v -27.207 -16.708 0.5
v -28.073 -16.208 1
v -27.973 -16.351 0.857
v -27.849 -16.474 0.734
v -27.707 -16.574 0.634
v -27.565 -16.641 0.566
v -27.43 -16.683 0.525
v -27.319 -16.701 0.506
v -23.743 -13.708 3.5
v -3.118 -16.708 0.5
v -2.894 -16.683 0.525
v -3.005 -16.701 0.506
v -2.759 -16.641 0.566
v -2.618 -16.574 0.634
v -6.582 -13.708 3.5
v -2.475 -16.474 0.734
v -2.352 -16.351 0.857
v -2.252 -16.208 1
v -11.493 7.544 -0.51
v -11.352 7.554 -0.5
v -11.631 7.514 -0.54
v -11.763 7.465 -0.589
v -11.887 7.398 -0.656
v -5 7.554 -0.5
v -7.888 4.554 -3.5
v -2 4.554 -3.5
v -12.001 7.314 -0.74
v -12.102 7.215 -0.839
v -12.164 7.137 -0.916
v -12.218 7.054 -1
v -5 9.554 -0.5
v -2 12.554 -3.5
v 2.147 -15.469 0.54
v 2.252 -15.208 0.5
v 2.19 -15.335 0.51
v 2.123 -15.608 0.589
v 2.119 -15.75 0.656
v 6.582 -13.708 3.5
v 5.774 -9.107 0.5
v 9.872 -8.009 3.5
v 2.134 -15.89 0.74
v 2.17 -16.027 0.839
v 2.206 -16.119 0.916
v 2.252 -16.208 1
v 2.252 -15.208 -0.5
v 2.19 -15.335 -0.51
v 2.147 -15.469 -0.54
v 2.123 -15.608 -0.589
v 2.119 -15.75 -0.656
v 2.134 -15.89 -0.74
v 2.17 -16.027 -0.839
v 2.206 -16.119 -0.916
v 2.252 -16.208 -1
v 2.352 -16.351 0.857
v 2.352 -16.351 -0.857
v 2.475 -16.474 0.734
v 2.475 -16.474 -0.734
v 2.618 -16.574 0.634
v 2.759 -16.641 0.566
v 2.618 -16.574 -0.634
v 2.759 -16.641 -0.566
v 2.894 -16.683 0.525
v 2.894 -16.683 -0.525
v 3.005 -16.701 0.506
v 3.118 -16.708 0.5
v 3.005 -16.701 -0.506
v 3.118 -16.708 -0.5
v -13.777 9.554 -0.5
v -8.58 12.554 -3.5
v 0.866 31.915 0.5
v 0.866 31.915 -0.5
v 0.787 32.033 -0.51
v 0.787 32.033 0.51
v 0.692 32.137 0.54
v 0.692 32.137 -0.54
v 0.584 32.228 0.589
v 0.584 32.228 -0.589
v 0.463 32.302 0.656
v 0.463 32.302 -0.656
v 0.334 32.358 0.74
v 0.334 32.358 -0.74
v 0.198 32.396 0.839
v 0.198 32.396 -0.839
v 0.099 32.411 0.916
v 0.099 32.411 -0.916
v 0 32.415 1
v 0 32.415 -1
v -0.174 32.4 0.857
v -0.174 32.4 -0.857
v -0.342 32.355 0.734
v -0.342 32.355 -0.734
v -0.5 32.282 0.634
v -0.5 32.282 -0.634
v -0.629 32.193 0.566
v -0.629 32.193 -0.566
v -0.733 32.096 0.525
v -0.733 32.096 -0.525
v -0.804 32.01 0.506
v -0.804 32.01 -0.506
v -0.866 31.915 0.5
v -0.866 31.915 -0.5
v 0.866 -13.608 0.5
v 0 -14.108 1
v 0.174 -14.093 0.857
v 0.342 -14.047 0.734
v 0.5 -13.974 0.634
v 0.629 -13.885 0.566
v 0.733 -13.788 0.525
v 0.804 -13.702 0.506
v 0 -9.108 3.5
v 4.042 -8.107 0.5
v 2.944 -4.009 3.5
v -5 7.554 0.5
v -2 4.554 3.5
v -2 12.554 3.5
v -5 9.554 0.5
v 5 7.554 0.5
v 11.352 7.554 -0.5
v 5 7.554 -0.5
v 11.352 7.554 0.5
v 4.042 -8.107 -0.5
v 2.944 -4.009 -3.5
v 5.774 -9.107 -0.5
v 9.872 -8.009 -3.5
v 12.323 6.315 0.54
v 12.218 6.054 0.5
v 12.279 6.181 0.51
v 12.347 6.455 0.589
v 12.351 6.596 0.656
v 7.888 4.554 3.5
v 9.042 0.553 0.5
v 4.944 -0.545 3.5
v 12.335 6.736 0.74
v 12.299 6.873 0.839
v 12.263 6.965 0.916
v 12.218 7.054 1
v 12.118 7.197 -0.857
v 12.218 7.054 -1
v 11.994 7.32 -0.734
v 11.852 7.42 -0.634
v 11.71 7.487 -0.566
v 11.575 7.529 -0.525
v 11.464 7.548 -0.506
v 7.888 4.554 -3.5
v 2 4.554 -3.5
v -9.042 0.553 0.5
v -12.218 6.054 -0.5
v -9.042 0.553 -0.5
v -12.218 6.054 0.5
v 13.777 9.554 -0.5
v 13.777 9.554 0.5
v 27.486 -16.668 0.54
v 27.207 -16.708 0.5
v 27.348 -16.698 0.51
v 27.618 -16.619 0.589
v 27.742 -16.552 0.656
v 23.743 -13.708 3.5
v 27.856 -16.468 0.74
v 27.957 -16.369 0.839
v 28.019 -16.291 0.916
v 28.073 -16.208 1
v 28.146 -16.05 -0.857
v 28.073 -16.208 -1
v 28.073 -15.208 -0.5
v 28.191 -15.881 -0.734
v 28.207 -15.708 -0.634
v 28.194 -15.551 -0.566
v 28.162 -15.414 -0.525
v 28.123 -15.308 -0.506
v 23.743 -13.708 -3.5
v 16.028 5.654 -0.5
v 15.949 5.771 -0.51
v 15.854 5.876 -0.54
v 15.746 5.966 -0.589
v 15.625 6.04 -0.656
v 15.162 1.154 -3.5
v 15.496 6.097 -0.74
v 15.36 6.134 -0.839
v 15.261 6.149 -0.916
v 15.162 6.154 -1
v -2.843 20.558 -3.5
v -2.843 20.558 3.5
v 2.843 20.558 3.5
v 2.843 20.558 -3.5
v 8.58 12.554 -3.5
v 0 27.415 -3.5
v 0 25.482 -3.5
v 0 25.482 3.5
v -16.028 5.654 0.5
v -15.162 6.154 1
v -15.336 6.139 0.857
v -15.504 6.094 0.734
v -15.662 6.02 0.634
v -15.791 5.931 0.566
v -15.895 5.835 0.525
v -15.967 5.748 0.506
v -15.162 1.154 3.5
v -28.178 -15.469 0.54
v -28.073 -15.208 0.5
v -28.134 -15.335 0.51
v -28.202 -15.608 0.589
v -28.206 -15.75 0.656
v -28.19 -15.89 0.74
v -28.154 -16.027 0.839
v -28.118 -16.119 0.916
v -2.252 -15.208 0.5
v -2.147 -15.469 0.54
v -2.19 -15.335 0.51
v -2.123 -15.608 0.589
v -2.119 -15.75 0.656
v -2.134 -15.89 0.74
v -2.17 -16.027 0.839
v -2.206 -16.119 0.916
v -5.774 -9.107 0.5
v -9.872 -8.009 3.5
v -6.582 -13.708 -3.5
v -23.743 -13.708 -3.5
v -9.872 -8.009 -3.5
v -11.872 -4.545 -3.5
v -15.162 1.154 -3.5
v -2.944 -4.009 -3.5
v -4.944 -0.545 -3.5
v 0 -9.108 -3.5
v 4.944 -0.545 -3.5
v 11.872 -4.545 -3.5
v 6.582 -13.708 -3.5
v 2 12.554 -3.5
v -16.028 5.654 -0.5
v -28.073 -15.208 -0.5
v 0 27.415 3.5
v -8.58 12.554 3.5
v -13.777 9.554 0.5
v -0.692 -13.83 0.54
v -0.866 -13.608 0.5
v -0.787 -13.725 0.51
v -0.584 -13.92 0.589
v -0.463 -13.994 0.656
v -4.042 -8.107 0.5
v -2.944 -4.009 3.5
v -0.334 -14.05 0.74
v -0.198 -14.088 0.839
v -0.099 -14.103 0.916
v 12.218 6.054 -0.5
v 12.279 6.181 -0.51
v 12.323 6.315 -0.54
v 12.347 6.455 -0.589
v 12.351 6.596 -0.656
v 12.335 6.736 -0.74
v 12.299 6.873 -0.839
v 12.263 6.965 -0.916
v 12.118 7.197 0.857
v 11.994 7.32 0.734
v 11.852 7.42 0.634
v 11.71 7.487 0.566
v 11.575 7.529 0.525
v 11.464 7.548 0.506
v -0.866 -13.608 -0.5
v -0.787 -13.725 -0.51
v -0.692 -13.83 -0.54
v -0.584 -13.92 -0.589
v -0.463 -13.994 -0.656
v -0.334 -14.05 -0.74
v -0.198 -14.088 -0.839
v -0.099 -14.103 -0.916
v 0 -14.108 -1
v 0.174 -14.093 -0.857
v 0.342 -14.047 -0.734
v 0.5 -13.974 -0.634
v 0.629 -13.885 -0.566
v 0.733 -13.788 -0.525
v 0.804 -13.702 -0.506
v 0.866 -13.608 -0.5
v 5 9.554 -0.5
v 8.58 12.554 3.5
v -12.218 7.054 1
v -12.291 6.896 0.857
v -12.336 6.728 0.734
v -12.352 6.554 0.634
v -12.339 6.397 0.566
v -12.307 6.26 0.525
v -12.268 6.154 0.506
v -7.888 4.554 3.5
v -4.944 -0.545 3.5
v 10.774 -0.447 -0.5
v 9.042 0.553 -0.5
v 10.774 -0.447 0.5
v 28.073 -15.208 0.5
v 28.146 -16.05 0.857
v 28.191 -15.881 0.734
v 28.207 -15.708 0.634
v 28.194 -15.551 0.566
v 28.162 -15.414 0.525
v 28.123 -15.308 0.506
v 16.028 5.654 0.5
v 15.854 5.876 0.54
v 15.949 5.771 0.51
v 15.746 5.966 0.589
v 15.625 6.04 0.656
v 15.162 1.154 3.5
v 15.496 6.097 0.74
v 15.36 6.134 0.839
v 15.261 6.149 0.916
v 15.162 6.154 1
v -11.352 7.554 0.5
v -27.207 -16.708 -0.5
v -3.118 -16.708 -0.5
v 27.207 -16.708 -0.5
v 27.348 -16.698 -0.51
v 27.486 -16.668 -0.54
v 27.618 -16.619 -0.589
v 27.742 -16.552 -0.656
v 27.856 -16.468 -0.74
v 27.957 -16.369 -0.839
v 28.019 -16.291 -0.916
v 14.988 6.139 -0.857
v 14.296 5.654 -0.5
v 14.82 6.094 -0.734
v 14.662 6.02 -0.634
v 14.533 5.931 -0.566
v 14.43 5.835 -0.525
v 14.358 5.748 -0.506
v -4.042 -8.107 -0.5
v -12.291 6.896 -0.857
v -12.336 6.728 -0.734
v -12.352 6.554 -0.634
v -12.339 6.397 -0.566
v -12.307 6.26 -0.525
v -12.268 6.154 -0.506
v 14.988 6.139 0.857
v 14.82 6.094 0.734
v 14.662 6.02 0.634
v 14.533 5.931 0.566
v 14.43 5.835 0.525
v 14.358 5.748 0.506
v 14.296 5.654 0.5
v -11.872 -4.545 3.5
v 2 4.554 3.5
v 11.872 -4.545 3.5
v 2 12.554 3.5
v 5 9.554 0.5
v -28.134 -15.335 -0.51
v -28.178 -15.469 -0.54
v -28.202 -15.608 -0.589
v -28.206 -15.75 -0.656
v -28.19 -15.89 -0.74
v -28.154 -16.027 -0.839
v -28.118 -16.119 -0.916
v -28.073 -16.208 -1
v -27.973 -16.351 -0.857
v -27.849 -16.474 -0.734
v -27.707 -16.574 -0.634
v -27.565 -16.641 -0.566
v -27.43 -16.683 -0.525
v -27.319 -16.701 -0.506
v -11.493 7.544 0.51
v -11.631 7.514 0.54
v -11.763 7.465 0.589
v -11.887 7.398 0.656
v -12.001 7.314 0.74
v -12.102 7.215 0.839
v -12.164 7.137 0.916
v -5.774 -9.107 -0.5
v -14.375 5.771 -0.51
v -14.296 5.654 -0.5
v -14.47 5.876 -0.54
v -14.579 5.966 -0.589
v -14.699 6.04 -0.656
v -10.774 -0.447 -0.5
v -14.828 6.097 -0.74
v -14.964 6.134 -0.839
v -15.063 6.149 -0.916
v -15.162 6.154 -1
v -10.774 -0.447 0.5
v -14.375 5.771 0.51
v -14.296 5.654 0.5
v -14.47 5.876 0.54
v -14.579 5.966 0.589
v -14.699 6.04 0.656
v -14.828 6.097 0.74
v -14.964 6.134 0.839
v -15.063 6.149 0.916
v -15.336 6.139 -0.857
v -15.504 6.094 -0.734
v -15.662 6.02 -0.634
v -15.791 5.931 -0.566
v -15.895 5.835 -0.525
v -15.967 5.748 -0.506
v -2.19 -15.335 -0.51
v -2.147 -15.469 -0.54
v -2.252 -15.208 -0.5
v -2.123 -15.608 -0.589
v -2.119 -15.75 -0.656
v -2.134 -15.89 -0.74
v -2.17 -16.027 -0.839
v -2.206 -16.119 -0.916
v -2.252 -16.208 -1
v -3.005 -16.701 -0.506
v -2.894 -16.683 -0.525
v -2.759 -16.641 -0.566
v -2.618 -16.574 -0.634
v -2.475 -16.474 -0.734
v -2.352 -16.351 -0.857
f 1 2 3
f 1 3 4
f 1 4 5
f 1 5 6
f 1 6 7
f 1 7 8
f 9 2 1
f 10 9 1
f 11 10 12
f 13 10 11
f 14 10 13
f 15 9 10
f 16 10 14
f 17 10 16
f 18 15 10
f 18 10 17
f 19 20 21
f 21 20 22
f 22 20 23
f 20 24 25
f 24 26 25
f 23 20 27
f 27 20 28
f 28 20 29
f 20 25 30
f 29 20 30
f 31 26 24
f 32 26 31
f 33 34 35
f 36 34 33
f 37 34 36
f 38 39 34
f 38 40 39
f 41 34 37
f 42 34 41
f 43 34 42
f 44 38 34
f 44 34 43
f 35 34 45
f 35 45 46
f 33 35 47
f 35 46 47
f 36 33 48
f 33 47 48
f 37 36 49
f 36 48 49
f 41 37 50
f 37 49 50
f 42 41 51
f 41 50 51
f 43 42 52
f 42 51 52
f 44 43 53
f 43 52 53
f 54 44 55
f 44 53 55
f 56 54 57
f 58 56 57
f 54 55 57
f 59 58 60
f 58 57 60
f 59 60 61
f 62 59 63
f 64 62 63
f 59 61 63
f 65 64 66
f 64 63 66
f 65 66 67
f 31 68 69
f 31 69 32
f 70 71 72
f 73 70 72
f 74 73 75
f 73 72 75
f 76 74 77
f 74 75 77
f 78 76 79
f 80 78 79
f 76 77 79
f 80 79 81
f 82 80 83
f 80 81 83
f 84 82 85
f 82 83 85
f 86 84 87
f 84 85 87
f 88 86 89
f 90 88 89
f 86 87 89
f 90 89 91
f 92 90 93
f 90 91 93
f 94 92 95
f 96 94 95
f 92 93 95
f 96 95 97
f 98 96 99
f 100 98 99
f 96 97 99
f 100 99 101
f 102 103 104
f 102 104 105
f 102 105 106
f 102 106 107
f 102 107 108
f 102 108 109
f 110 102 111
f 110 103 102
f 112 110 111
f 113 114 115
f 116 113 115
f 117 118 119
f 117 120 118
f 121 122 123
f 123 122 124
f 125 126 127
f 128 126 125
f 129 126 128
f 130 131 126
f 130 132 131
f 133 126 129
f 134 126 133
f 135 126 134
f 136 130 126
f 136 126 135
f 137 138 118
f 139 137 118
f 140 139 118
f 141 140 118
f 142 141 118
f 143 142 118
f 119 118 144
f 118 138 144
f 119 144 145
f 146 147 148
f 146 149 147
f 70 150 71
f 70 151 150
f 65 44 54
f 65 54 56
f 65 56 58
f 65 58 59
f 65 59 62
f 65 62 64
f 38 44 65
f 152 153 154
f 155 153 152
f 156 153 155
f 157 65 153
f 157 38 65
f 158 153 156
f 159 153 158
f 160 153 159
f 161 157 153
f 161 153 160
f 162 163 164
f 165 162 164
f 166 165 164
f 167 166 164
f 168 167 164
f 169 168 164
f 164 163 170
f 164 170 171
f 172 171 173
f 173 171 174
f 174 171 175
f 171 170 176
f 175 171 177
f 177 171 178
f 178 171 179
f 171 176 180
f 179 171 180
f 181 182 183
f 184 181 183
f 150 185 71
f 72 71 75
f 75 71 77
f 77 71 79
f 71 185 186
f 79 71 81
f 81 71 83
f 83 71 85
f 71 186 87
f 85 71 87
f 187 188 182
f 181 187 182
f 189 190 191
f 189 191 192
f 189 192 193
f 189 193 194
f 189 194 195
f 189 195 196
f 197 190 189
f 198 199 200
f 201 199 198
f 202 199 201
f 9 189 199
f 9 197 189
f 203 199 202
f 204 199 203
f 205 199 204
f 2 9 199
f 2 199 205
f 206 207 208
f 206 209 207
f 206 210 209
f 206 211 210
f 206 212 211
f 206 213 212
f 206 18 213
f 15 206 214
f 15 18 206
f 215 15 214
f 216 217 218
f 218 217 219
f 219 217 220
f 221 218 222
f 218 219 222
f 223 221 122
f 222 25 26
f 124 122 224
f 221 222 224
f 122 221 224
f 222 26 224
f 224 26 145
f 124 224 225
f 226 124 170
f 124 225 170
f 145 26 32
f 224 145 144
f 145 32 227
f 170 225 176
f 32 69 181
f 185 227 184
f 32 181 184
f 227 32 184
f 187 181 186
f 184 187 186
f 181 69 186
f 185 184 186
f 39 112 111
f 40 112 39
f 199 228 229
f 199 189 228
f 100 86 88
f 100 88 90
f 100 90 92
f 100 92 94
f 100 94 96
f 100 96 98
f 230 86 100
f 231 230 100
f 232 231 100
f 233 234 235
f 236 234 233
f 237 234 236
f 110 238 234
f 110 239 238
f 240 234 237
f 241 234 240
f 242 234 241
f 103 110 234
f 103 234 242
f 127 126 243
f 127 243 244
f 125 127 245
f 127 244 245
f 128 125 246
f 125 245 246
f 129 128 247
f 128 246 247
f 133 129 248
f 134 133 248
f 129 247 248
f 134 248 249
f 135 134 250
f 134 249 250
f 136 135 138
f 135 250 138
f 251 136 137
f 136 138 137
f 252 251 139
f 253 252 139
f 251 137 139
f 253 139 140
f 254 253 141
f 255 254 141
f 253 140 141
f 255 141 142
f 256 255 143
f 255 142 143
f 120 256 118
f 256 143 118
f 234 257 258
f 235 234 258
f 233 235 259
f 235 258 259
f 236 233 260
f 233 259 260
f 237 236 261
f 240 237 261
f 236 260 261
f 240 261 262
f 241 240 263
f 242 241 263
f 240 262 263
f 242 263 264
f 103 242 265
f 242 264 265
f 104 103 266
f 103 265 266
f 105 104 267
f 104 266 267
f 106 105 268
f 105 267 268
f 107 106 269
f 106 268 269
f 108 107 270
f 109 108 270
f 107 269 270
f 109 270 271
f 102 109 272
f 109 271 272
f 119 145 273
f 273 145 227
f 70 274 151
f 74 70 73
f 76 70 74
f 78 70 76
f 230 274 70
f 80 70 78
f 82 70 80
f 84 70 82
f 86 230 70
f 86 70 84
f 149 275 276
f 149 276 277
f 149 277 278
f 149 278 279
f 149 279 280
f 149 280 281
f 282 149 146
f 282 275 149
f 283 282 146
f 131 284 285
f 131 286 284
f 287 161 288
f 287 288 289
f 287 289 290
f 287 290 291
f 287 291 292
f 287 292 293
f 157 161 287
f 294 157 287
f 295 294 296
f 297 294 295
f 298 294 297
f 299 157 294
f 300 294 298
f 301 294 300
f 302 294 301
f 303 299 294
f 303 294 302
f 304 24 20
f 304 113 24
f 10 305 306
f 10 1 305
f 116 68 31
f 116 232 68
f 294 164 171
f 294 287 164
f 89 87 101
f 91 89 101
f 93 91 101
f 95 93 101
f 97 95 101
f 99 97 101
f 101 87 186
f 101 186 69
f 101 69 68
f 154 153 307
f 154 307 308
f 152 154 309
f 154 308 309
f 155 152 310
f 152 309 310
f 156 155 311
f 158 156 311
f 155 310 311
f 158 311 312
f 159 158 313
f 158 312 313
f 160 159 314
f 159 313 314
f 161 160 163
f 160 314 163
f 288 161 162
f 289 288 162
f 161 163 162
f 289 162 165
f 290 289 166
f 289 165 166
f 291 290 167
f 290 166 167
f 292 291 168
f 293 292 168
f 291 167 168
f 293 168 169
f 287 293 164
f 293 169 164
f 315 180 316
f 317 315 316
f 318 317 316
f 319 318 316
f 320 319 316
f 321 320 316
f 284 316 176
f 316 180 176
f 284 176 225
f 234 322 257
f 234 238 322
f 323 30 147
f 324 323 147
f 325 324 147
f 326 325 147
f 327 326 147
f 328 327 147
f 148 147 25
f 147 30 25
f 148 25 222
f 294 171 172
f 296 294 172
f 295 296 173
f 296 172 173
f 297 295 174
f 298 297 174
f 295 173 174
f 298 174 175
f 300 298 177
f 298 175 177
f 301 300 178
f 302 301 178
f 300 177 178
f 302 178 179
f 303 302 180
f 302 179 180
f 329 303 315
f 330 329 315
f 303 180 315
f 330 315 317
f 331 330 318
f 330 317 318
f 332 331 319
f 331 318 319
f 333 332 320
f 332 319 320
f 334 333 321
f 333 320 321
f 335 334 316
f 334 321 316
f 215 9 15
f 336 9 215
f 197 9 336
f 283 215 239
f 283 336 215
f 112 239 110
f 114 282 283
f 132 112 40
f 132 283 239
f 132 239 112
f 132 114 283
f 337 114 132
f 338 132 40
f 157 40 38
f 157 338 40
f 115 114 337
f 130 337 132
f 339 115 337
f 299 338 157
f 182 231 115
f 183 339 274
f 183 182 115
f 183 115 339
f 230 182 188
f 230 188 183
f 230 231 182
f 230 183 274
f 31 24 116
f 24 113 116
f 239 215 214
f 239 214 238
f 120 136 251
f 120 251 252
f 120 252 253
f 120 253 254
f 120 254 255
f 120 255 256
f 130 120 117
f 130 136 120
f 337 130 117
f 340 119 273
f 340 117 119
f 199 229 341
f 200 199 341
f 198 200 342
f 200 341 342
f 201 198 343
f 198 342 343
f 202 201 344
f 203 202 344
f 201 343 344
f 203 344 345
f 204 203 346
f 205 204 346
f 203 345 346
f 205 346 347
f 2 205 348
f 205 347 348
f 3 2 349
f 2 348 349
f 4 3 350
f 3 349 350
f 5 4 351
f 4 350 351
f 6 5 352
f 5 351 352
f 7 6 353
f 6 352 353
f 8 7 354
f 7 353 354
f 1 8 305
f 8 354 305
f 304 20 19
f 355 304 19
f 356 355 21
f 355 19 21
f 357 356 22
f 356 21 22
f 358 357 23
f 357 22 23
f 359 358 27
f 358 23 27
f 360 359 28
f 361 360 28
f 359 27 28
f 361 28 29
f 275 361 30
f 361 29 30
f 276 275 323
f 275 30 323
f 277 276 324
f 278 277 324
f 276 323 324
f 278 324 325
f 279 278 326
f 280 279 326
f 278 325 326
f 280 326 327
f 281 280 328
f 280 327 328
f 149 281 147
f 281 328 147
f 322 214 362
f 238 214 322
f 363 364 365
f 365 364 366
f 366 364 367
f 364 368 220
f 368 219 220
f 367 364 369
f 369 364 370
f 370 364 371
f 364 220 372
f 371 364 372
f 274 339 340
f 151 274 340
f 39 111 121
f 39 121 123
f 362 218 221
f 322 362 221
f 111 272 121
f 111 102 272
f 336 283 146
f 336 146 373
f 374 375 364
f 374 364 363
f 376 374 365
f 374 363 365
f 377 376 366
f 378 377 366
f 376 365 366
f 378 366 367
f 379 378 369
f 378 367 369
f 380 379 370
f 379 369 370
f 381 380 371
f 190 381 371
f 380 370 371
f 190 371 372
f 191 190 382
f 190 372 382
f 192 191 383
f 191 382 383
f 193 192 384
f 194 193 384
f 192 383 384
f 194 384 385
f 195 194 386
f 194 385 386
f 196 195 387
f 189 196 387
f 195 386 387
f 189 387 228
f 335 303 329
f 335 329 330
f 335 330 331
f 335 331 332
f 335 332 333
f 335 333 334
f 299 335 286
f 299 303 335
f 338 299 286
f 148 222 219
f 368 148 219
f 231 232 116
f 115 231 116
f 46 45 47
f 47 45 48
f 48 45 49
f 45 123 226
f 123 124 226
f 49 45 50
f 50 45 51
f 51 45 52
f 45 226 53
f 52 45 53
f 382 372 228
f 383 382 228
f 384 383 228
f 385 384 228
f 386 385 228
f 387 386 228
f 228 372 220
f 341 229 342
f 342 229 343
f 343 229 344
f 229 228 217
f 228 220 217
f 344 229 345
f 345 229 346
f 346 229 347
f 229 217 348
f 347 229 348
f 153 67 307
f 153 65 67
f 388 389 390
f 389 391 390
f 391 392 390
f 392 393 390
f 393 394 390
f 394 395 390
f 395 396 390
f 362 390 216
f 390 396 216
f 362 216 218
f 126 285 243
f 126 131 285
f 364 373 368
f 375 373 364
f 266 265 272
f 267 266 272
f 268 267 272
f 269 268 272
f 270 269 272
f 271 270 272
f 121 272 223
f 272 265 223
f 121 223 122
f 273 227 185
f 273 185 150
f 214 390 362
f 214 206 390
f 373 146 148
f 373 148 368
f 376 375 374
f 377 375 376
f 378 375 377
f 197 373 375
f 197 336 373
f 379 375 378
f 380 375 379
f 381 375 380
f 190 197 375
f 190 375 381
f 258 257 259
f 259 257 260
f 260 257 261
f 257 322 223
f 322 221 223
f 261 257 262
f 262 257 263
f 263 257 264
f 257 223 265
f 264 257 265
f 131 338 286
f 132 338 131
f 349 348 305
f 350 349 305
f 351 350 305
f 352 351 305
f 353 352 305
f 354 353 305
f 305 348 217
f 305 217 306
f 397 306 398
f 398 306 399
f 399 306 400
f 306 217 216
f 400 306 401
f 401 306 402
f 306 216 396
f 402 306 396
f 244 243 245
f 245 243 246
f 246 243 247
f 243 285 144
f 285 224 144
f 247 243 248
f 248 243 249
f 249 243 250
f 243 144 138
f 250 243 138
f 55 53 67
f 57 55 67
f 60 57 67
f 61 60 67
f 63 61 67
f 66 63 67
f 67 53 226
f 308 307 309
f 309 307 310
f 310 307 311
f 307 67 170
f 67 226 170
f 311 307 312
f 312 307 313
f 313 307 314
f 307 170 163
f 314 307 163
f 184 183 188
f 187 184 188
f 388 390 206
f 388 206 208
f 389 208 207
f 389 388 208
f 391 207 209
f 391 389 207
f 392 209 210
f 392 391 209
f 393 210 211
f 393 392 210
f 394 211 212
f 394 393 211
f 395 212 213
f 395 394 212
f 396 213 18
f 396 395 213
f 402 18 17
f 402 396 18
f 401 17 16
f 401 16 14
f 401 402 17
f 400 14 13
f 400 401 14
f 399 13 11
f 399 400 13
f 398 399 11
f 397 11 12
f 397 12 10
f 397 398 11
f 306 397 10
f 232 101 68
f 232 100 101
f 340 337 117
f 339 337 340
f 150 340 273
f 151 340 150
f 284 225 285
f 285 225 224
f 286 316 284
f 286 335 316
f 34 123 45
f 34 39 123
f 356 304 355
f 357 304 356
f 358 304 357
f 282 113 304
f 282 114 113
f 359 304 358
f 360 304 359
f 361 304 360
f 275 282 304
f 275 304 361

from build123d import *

# Parameters (mm, degrees)
F0_W     = 5
F0_H     = 2
F1_DEPTH = 3.5
F2_SIZE  = 3
F3_R     = 1
F6_DEPTH = 9.2


with BuildPart() as f1:
    # F0 (on Top) → F1 (new body)
    with BuildSketch(Plane.XY):
        Polygon((-4.0418434781, -8.107062112), (0, -15.1077403724), (0, 7.5538701862), (-5, 7.5538701862), (-13.0836869563, 7.5538701862), (-9.0418434781, 0.5531919258), (-6.5418434781, -3.7769350931), align=None)
        Polygon((0, 7.5538701862), (0, -15.1077403724), (4.0418434781, -8.107062112), (6.5418434781, -3.7769350931), (9.0418434781, 0.5531919258), (13.0836869563, 7.5538701862), (5, 7.5538701862), align=None)
        Polygon((-10.7738942857, -0.4468080742), (-8.2738942857, -4.7769350931), (-6.5418434781, -3.7769350931), (-9.0418434781, 0.5531919258), align=None)
        Polygon((-8.2738942857, -4.7769350931), (-5.7738942857, -9.107062112), (-4.0418434781, -8.107062112), (-6.5418434781, -3.7769350931), align=None)
        Polygon((8.2738942857, -4.7769350931), (10.7738942857, -0.4468080742), (9.0418434781, 0.5531919258), (6.5418434781, -3.7769350931), align=None)
        Polygon((4.0418434781, -8.107062112), (5.7738942857, -9.107062112), (8.2738942857, -4.7769350931), (6.5418434781, -3.7769350931), align=None)
        with Locations((2.5, 8.5538701862)):
            Rectangle(F0_W, F0_H)
        with Locations((-2.5, 8.5538701862)):
            Rectangle(F0_W, F0_H)
        Polygon((-28.9386550611, -16.7077402895), (-1.3856406939, -16.7077402895), (-5.7738942857, -9.107062112), (-8.2738942857, -4.7769350931), (-10.7738942857, -0.4468080742), (-15.1621478775, 7.1538701033), align=None)
        Polygon((5.7738942857, -9.107062112), (1.3856406939, -16.7077402895), (28.9386550611, -16.7077402895), (15.1621478775, 7.1538701033), (10.7738942857, -0.4468080742), (8.2738942857, -4.7769350931), align=None)
        Polygon((5, 9.5538701862), (13.7765071836, 9.5538701862), (0, 33.415480579), (0, 9.5538701862), align=None)
        Polygon((0, 9.5538701862), (0, 33.415480579), (-13.7765071836, 9.5538701862), (-5, 9.5538701862), align=None)
    extrude(amount=F1_DEPTH)

    # F2
    f2_edges = [f1.edges().sort_by_distance(p)[0] for p in [
        (-11.062765, 4.053531, 3.5),
        (-9.907869, 0.053192, 3.5),
        (-12.968021, 3.353531, 3.5),
        (-22.050401, -4.776935, 3.5),
        (-15.162148, -16.70774, 3.5),
        (-3.579767, -12.907401, 3.5),
        (-4.907869, -8.607062, 3.5),
        (-2.020922, -11.607401, 3.5),
        (2.020922, -11.607401, 3.5),
        (4.907869, -8.607062, 3.5),
        (3.579767, -12.907401, 3.5),
        (15.162148, -16.70774, 3.5),
        (22.050401, -4.776935, 3.5),
        (12.968021, 3.353531, 3.5),
        (9.907869, 0.053192, 3.5),
        (11.062765, 4.053531, 3.5),
        (9.041843, 7.55387, 3.5),
        (5, 8.55387, 3.5),
        (9.388254, 9.55387, 3.5),
        (6.888254, 21.484675, 3.5),
        (-6.888254, 21.484675, 3.5),
        (-9.388254, 9.55387, 3.5),
        (-5, 8.55387, 3.5),
        (-9.041843, 7.55387, 3.5),
    ]]
    chamfer(f2_edges, length=F2_SIZE)

    # F3
    f3_edges = [f1.edges().sort_by_distance(p)[0] for p in [
        (-28.938655, -16.70774, 0.25),
        (28.938655, -16.70774, 0.25),
        (0, 33.415481, 0.25),
        (-15.162148, 7.15387, 0.25),
        (15.162148, 7.15387, 0.25),
        (-1.385641, -16.70774, 0.25),
        (1.385641, -16.70774, 0.25),
        (-13.083687, 7.55387, 0.25),
        (13.083687, 7.55387, 0.25),
        (0, -15.10774, 0.25),
    ]]
    fillet(f3_edges, radius=F3_R)

    # F4: F1 across plane


with BuildPart() as f1_1:
    add(f1.part)
    add(f1.part.mirror(Plane.XY))

    # F5 (on face) → F6 (cut)
    with BuildSketch(Plane.XY.offset(3.5)):
        Polygon((-2.8427077909, 20.5582287163), (2.8427077909, 20.5582287163), (0, 25.4819430411), align=None)
    extrude(amount=-F6_DEPTH, mode=Mode.SUBTRACT)


solid = f1_1.part
